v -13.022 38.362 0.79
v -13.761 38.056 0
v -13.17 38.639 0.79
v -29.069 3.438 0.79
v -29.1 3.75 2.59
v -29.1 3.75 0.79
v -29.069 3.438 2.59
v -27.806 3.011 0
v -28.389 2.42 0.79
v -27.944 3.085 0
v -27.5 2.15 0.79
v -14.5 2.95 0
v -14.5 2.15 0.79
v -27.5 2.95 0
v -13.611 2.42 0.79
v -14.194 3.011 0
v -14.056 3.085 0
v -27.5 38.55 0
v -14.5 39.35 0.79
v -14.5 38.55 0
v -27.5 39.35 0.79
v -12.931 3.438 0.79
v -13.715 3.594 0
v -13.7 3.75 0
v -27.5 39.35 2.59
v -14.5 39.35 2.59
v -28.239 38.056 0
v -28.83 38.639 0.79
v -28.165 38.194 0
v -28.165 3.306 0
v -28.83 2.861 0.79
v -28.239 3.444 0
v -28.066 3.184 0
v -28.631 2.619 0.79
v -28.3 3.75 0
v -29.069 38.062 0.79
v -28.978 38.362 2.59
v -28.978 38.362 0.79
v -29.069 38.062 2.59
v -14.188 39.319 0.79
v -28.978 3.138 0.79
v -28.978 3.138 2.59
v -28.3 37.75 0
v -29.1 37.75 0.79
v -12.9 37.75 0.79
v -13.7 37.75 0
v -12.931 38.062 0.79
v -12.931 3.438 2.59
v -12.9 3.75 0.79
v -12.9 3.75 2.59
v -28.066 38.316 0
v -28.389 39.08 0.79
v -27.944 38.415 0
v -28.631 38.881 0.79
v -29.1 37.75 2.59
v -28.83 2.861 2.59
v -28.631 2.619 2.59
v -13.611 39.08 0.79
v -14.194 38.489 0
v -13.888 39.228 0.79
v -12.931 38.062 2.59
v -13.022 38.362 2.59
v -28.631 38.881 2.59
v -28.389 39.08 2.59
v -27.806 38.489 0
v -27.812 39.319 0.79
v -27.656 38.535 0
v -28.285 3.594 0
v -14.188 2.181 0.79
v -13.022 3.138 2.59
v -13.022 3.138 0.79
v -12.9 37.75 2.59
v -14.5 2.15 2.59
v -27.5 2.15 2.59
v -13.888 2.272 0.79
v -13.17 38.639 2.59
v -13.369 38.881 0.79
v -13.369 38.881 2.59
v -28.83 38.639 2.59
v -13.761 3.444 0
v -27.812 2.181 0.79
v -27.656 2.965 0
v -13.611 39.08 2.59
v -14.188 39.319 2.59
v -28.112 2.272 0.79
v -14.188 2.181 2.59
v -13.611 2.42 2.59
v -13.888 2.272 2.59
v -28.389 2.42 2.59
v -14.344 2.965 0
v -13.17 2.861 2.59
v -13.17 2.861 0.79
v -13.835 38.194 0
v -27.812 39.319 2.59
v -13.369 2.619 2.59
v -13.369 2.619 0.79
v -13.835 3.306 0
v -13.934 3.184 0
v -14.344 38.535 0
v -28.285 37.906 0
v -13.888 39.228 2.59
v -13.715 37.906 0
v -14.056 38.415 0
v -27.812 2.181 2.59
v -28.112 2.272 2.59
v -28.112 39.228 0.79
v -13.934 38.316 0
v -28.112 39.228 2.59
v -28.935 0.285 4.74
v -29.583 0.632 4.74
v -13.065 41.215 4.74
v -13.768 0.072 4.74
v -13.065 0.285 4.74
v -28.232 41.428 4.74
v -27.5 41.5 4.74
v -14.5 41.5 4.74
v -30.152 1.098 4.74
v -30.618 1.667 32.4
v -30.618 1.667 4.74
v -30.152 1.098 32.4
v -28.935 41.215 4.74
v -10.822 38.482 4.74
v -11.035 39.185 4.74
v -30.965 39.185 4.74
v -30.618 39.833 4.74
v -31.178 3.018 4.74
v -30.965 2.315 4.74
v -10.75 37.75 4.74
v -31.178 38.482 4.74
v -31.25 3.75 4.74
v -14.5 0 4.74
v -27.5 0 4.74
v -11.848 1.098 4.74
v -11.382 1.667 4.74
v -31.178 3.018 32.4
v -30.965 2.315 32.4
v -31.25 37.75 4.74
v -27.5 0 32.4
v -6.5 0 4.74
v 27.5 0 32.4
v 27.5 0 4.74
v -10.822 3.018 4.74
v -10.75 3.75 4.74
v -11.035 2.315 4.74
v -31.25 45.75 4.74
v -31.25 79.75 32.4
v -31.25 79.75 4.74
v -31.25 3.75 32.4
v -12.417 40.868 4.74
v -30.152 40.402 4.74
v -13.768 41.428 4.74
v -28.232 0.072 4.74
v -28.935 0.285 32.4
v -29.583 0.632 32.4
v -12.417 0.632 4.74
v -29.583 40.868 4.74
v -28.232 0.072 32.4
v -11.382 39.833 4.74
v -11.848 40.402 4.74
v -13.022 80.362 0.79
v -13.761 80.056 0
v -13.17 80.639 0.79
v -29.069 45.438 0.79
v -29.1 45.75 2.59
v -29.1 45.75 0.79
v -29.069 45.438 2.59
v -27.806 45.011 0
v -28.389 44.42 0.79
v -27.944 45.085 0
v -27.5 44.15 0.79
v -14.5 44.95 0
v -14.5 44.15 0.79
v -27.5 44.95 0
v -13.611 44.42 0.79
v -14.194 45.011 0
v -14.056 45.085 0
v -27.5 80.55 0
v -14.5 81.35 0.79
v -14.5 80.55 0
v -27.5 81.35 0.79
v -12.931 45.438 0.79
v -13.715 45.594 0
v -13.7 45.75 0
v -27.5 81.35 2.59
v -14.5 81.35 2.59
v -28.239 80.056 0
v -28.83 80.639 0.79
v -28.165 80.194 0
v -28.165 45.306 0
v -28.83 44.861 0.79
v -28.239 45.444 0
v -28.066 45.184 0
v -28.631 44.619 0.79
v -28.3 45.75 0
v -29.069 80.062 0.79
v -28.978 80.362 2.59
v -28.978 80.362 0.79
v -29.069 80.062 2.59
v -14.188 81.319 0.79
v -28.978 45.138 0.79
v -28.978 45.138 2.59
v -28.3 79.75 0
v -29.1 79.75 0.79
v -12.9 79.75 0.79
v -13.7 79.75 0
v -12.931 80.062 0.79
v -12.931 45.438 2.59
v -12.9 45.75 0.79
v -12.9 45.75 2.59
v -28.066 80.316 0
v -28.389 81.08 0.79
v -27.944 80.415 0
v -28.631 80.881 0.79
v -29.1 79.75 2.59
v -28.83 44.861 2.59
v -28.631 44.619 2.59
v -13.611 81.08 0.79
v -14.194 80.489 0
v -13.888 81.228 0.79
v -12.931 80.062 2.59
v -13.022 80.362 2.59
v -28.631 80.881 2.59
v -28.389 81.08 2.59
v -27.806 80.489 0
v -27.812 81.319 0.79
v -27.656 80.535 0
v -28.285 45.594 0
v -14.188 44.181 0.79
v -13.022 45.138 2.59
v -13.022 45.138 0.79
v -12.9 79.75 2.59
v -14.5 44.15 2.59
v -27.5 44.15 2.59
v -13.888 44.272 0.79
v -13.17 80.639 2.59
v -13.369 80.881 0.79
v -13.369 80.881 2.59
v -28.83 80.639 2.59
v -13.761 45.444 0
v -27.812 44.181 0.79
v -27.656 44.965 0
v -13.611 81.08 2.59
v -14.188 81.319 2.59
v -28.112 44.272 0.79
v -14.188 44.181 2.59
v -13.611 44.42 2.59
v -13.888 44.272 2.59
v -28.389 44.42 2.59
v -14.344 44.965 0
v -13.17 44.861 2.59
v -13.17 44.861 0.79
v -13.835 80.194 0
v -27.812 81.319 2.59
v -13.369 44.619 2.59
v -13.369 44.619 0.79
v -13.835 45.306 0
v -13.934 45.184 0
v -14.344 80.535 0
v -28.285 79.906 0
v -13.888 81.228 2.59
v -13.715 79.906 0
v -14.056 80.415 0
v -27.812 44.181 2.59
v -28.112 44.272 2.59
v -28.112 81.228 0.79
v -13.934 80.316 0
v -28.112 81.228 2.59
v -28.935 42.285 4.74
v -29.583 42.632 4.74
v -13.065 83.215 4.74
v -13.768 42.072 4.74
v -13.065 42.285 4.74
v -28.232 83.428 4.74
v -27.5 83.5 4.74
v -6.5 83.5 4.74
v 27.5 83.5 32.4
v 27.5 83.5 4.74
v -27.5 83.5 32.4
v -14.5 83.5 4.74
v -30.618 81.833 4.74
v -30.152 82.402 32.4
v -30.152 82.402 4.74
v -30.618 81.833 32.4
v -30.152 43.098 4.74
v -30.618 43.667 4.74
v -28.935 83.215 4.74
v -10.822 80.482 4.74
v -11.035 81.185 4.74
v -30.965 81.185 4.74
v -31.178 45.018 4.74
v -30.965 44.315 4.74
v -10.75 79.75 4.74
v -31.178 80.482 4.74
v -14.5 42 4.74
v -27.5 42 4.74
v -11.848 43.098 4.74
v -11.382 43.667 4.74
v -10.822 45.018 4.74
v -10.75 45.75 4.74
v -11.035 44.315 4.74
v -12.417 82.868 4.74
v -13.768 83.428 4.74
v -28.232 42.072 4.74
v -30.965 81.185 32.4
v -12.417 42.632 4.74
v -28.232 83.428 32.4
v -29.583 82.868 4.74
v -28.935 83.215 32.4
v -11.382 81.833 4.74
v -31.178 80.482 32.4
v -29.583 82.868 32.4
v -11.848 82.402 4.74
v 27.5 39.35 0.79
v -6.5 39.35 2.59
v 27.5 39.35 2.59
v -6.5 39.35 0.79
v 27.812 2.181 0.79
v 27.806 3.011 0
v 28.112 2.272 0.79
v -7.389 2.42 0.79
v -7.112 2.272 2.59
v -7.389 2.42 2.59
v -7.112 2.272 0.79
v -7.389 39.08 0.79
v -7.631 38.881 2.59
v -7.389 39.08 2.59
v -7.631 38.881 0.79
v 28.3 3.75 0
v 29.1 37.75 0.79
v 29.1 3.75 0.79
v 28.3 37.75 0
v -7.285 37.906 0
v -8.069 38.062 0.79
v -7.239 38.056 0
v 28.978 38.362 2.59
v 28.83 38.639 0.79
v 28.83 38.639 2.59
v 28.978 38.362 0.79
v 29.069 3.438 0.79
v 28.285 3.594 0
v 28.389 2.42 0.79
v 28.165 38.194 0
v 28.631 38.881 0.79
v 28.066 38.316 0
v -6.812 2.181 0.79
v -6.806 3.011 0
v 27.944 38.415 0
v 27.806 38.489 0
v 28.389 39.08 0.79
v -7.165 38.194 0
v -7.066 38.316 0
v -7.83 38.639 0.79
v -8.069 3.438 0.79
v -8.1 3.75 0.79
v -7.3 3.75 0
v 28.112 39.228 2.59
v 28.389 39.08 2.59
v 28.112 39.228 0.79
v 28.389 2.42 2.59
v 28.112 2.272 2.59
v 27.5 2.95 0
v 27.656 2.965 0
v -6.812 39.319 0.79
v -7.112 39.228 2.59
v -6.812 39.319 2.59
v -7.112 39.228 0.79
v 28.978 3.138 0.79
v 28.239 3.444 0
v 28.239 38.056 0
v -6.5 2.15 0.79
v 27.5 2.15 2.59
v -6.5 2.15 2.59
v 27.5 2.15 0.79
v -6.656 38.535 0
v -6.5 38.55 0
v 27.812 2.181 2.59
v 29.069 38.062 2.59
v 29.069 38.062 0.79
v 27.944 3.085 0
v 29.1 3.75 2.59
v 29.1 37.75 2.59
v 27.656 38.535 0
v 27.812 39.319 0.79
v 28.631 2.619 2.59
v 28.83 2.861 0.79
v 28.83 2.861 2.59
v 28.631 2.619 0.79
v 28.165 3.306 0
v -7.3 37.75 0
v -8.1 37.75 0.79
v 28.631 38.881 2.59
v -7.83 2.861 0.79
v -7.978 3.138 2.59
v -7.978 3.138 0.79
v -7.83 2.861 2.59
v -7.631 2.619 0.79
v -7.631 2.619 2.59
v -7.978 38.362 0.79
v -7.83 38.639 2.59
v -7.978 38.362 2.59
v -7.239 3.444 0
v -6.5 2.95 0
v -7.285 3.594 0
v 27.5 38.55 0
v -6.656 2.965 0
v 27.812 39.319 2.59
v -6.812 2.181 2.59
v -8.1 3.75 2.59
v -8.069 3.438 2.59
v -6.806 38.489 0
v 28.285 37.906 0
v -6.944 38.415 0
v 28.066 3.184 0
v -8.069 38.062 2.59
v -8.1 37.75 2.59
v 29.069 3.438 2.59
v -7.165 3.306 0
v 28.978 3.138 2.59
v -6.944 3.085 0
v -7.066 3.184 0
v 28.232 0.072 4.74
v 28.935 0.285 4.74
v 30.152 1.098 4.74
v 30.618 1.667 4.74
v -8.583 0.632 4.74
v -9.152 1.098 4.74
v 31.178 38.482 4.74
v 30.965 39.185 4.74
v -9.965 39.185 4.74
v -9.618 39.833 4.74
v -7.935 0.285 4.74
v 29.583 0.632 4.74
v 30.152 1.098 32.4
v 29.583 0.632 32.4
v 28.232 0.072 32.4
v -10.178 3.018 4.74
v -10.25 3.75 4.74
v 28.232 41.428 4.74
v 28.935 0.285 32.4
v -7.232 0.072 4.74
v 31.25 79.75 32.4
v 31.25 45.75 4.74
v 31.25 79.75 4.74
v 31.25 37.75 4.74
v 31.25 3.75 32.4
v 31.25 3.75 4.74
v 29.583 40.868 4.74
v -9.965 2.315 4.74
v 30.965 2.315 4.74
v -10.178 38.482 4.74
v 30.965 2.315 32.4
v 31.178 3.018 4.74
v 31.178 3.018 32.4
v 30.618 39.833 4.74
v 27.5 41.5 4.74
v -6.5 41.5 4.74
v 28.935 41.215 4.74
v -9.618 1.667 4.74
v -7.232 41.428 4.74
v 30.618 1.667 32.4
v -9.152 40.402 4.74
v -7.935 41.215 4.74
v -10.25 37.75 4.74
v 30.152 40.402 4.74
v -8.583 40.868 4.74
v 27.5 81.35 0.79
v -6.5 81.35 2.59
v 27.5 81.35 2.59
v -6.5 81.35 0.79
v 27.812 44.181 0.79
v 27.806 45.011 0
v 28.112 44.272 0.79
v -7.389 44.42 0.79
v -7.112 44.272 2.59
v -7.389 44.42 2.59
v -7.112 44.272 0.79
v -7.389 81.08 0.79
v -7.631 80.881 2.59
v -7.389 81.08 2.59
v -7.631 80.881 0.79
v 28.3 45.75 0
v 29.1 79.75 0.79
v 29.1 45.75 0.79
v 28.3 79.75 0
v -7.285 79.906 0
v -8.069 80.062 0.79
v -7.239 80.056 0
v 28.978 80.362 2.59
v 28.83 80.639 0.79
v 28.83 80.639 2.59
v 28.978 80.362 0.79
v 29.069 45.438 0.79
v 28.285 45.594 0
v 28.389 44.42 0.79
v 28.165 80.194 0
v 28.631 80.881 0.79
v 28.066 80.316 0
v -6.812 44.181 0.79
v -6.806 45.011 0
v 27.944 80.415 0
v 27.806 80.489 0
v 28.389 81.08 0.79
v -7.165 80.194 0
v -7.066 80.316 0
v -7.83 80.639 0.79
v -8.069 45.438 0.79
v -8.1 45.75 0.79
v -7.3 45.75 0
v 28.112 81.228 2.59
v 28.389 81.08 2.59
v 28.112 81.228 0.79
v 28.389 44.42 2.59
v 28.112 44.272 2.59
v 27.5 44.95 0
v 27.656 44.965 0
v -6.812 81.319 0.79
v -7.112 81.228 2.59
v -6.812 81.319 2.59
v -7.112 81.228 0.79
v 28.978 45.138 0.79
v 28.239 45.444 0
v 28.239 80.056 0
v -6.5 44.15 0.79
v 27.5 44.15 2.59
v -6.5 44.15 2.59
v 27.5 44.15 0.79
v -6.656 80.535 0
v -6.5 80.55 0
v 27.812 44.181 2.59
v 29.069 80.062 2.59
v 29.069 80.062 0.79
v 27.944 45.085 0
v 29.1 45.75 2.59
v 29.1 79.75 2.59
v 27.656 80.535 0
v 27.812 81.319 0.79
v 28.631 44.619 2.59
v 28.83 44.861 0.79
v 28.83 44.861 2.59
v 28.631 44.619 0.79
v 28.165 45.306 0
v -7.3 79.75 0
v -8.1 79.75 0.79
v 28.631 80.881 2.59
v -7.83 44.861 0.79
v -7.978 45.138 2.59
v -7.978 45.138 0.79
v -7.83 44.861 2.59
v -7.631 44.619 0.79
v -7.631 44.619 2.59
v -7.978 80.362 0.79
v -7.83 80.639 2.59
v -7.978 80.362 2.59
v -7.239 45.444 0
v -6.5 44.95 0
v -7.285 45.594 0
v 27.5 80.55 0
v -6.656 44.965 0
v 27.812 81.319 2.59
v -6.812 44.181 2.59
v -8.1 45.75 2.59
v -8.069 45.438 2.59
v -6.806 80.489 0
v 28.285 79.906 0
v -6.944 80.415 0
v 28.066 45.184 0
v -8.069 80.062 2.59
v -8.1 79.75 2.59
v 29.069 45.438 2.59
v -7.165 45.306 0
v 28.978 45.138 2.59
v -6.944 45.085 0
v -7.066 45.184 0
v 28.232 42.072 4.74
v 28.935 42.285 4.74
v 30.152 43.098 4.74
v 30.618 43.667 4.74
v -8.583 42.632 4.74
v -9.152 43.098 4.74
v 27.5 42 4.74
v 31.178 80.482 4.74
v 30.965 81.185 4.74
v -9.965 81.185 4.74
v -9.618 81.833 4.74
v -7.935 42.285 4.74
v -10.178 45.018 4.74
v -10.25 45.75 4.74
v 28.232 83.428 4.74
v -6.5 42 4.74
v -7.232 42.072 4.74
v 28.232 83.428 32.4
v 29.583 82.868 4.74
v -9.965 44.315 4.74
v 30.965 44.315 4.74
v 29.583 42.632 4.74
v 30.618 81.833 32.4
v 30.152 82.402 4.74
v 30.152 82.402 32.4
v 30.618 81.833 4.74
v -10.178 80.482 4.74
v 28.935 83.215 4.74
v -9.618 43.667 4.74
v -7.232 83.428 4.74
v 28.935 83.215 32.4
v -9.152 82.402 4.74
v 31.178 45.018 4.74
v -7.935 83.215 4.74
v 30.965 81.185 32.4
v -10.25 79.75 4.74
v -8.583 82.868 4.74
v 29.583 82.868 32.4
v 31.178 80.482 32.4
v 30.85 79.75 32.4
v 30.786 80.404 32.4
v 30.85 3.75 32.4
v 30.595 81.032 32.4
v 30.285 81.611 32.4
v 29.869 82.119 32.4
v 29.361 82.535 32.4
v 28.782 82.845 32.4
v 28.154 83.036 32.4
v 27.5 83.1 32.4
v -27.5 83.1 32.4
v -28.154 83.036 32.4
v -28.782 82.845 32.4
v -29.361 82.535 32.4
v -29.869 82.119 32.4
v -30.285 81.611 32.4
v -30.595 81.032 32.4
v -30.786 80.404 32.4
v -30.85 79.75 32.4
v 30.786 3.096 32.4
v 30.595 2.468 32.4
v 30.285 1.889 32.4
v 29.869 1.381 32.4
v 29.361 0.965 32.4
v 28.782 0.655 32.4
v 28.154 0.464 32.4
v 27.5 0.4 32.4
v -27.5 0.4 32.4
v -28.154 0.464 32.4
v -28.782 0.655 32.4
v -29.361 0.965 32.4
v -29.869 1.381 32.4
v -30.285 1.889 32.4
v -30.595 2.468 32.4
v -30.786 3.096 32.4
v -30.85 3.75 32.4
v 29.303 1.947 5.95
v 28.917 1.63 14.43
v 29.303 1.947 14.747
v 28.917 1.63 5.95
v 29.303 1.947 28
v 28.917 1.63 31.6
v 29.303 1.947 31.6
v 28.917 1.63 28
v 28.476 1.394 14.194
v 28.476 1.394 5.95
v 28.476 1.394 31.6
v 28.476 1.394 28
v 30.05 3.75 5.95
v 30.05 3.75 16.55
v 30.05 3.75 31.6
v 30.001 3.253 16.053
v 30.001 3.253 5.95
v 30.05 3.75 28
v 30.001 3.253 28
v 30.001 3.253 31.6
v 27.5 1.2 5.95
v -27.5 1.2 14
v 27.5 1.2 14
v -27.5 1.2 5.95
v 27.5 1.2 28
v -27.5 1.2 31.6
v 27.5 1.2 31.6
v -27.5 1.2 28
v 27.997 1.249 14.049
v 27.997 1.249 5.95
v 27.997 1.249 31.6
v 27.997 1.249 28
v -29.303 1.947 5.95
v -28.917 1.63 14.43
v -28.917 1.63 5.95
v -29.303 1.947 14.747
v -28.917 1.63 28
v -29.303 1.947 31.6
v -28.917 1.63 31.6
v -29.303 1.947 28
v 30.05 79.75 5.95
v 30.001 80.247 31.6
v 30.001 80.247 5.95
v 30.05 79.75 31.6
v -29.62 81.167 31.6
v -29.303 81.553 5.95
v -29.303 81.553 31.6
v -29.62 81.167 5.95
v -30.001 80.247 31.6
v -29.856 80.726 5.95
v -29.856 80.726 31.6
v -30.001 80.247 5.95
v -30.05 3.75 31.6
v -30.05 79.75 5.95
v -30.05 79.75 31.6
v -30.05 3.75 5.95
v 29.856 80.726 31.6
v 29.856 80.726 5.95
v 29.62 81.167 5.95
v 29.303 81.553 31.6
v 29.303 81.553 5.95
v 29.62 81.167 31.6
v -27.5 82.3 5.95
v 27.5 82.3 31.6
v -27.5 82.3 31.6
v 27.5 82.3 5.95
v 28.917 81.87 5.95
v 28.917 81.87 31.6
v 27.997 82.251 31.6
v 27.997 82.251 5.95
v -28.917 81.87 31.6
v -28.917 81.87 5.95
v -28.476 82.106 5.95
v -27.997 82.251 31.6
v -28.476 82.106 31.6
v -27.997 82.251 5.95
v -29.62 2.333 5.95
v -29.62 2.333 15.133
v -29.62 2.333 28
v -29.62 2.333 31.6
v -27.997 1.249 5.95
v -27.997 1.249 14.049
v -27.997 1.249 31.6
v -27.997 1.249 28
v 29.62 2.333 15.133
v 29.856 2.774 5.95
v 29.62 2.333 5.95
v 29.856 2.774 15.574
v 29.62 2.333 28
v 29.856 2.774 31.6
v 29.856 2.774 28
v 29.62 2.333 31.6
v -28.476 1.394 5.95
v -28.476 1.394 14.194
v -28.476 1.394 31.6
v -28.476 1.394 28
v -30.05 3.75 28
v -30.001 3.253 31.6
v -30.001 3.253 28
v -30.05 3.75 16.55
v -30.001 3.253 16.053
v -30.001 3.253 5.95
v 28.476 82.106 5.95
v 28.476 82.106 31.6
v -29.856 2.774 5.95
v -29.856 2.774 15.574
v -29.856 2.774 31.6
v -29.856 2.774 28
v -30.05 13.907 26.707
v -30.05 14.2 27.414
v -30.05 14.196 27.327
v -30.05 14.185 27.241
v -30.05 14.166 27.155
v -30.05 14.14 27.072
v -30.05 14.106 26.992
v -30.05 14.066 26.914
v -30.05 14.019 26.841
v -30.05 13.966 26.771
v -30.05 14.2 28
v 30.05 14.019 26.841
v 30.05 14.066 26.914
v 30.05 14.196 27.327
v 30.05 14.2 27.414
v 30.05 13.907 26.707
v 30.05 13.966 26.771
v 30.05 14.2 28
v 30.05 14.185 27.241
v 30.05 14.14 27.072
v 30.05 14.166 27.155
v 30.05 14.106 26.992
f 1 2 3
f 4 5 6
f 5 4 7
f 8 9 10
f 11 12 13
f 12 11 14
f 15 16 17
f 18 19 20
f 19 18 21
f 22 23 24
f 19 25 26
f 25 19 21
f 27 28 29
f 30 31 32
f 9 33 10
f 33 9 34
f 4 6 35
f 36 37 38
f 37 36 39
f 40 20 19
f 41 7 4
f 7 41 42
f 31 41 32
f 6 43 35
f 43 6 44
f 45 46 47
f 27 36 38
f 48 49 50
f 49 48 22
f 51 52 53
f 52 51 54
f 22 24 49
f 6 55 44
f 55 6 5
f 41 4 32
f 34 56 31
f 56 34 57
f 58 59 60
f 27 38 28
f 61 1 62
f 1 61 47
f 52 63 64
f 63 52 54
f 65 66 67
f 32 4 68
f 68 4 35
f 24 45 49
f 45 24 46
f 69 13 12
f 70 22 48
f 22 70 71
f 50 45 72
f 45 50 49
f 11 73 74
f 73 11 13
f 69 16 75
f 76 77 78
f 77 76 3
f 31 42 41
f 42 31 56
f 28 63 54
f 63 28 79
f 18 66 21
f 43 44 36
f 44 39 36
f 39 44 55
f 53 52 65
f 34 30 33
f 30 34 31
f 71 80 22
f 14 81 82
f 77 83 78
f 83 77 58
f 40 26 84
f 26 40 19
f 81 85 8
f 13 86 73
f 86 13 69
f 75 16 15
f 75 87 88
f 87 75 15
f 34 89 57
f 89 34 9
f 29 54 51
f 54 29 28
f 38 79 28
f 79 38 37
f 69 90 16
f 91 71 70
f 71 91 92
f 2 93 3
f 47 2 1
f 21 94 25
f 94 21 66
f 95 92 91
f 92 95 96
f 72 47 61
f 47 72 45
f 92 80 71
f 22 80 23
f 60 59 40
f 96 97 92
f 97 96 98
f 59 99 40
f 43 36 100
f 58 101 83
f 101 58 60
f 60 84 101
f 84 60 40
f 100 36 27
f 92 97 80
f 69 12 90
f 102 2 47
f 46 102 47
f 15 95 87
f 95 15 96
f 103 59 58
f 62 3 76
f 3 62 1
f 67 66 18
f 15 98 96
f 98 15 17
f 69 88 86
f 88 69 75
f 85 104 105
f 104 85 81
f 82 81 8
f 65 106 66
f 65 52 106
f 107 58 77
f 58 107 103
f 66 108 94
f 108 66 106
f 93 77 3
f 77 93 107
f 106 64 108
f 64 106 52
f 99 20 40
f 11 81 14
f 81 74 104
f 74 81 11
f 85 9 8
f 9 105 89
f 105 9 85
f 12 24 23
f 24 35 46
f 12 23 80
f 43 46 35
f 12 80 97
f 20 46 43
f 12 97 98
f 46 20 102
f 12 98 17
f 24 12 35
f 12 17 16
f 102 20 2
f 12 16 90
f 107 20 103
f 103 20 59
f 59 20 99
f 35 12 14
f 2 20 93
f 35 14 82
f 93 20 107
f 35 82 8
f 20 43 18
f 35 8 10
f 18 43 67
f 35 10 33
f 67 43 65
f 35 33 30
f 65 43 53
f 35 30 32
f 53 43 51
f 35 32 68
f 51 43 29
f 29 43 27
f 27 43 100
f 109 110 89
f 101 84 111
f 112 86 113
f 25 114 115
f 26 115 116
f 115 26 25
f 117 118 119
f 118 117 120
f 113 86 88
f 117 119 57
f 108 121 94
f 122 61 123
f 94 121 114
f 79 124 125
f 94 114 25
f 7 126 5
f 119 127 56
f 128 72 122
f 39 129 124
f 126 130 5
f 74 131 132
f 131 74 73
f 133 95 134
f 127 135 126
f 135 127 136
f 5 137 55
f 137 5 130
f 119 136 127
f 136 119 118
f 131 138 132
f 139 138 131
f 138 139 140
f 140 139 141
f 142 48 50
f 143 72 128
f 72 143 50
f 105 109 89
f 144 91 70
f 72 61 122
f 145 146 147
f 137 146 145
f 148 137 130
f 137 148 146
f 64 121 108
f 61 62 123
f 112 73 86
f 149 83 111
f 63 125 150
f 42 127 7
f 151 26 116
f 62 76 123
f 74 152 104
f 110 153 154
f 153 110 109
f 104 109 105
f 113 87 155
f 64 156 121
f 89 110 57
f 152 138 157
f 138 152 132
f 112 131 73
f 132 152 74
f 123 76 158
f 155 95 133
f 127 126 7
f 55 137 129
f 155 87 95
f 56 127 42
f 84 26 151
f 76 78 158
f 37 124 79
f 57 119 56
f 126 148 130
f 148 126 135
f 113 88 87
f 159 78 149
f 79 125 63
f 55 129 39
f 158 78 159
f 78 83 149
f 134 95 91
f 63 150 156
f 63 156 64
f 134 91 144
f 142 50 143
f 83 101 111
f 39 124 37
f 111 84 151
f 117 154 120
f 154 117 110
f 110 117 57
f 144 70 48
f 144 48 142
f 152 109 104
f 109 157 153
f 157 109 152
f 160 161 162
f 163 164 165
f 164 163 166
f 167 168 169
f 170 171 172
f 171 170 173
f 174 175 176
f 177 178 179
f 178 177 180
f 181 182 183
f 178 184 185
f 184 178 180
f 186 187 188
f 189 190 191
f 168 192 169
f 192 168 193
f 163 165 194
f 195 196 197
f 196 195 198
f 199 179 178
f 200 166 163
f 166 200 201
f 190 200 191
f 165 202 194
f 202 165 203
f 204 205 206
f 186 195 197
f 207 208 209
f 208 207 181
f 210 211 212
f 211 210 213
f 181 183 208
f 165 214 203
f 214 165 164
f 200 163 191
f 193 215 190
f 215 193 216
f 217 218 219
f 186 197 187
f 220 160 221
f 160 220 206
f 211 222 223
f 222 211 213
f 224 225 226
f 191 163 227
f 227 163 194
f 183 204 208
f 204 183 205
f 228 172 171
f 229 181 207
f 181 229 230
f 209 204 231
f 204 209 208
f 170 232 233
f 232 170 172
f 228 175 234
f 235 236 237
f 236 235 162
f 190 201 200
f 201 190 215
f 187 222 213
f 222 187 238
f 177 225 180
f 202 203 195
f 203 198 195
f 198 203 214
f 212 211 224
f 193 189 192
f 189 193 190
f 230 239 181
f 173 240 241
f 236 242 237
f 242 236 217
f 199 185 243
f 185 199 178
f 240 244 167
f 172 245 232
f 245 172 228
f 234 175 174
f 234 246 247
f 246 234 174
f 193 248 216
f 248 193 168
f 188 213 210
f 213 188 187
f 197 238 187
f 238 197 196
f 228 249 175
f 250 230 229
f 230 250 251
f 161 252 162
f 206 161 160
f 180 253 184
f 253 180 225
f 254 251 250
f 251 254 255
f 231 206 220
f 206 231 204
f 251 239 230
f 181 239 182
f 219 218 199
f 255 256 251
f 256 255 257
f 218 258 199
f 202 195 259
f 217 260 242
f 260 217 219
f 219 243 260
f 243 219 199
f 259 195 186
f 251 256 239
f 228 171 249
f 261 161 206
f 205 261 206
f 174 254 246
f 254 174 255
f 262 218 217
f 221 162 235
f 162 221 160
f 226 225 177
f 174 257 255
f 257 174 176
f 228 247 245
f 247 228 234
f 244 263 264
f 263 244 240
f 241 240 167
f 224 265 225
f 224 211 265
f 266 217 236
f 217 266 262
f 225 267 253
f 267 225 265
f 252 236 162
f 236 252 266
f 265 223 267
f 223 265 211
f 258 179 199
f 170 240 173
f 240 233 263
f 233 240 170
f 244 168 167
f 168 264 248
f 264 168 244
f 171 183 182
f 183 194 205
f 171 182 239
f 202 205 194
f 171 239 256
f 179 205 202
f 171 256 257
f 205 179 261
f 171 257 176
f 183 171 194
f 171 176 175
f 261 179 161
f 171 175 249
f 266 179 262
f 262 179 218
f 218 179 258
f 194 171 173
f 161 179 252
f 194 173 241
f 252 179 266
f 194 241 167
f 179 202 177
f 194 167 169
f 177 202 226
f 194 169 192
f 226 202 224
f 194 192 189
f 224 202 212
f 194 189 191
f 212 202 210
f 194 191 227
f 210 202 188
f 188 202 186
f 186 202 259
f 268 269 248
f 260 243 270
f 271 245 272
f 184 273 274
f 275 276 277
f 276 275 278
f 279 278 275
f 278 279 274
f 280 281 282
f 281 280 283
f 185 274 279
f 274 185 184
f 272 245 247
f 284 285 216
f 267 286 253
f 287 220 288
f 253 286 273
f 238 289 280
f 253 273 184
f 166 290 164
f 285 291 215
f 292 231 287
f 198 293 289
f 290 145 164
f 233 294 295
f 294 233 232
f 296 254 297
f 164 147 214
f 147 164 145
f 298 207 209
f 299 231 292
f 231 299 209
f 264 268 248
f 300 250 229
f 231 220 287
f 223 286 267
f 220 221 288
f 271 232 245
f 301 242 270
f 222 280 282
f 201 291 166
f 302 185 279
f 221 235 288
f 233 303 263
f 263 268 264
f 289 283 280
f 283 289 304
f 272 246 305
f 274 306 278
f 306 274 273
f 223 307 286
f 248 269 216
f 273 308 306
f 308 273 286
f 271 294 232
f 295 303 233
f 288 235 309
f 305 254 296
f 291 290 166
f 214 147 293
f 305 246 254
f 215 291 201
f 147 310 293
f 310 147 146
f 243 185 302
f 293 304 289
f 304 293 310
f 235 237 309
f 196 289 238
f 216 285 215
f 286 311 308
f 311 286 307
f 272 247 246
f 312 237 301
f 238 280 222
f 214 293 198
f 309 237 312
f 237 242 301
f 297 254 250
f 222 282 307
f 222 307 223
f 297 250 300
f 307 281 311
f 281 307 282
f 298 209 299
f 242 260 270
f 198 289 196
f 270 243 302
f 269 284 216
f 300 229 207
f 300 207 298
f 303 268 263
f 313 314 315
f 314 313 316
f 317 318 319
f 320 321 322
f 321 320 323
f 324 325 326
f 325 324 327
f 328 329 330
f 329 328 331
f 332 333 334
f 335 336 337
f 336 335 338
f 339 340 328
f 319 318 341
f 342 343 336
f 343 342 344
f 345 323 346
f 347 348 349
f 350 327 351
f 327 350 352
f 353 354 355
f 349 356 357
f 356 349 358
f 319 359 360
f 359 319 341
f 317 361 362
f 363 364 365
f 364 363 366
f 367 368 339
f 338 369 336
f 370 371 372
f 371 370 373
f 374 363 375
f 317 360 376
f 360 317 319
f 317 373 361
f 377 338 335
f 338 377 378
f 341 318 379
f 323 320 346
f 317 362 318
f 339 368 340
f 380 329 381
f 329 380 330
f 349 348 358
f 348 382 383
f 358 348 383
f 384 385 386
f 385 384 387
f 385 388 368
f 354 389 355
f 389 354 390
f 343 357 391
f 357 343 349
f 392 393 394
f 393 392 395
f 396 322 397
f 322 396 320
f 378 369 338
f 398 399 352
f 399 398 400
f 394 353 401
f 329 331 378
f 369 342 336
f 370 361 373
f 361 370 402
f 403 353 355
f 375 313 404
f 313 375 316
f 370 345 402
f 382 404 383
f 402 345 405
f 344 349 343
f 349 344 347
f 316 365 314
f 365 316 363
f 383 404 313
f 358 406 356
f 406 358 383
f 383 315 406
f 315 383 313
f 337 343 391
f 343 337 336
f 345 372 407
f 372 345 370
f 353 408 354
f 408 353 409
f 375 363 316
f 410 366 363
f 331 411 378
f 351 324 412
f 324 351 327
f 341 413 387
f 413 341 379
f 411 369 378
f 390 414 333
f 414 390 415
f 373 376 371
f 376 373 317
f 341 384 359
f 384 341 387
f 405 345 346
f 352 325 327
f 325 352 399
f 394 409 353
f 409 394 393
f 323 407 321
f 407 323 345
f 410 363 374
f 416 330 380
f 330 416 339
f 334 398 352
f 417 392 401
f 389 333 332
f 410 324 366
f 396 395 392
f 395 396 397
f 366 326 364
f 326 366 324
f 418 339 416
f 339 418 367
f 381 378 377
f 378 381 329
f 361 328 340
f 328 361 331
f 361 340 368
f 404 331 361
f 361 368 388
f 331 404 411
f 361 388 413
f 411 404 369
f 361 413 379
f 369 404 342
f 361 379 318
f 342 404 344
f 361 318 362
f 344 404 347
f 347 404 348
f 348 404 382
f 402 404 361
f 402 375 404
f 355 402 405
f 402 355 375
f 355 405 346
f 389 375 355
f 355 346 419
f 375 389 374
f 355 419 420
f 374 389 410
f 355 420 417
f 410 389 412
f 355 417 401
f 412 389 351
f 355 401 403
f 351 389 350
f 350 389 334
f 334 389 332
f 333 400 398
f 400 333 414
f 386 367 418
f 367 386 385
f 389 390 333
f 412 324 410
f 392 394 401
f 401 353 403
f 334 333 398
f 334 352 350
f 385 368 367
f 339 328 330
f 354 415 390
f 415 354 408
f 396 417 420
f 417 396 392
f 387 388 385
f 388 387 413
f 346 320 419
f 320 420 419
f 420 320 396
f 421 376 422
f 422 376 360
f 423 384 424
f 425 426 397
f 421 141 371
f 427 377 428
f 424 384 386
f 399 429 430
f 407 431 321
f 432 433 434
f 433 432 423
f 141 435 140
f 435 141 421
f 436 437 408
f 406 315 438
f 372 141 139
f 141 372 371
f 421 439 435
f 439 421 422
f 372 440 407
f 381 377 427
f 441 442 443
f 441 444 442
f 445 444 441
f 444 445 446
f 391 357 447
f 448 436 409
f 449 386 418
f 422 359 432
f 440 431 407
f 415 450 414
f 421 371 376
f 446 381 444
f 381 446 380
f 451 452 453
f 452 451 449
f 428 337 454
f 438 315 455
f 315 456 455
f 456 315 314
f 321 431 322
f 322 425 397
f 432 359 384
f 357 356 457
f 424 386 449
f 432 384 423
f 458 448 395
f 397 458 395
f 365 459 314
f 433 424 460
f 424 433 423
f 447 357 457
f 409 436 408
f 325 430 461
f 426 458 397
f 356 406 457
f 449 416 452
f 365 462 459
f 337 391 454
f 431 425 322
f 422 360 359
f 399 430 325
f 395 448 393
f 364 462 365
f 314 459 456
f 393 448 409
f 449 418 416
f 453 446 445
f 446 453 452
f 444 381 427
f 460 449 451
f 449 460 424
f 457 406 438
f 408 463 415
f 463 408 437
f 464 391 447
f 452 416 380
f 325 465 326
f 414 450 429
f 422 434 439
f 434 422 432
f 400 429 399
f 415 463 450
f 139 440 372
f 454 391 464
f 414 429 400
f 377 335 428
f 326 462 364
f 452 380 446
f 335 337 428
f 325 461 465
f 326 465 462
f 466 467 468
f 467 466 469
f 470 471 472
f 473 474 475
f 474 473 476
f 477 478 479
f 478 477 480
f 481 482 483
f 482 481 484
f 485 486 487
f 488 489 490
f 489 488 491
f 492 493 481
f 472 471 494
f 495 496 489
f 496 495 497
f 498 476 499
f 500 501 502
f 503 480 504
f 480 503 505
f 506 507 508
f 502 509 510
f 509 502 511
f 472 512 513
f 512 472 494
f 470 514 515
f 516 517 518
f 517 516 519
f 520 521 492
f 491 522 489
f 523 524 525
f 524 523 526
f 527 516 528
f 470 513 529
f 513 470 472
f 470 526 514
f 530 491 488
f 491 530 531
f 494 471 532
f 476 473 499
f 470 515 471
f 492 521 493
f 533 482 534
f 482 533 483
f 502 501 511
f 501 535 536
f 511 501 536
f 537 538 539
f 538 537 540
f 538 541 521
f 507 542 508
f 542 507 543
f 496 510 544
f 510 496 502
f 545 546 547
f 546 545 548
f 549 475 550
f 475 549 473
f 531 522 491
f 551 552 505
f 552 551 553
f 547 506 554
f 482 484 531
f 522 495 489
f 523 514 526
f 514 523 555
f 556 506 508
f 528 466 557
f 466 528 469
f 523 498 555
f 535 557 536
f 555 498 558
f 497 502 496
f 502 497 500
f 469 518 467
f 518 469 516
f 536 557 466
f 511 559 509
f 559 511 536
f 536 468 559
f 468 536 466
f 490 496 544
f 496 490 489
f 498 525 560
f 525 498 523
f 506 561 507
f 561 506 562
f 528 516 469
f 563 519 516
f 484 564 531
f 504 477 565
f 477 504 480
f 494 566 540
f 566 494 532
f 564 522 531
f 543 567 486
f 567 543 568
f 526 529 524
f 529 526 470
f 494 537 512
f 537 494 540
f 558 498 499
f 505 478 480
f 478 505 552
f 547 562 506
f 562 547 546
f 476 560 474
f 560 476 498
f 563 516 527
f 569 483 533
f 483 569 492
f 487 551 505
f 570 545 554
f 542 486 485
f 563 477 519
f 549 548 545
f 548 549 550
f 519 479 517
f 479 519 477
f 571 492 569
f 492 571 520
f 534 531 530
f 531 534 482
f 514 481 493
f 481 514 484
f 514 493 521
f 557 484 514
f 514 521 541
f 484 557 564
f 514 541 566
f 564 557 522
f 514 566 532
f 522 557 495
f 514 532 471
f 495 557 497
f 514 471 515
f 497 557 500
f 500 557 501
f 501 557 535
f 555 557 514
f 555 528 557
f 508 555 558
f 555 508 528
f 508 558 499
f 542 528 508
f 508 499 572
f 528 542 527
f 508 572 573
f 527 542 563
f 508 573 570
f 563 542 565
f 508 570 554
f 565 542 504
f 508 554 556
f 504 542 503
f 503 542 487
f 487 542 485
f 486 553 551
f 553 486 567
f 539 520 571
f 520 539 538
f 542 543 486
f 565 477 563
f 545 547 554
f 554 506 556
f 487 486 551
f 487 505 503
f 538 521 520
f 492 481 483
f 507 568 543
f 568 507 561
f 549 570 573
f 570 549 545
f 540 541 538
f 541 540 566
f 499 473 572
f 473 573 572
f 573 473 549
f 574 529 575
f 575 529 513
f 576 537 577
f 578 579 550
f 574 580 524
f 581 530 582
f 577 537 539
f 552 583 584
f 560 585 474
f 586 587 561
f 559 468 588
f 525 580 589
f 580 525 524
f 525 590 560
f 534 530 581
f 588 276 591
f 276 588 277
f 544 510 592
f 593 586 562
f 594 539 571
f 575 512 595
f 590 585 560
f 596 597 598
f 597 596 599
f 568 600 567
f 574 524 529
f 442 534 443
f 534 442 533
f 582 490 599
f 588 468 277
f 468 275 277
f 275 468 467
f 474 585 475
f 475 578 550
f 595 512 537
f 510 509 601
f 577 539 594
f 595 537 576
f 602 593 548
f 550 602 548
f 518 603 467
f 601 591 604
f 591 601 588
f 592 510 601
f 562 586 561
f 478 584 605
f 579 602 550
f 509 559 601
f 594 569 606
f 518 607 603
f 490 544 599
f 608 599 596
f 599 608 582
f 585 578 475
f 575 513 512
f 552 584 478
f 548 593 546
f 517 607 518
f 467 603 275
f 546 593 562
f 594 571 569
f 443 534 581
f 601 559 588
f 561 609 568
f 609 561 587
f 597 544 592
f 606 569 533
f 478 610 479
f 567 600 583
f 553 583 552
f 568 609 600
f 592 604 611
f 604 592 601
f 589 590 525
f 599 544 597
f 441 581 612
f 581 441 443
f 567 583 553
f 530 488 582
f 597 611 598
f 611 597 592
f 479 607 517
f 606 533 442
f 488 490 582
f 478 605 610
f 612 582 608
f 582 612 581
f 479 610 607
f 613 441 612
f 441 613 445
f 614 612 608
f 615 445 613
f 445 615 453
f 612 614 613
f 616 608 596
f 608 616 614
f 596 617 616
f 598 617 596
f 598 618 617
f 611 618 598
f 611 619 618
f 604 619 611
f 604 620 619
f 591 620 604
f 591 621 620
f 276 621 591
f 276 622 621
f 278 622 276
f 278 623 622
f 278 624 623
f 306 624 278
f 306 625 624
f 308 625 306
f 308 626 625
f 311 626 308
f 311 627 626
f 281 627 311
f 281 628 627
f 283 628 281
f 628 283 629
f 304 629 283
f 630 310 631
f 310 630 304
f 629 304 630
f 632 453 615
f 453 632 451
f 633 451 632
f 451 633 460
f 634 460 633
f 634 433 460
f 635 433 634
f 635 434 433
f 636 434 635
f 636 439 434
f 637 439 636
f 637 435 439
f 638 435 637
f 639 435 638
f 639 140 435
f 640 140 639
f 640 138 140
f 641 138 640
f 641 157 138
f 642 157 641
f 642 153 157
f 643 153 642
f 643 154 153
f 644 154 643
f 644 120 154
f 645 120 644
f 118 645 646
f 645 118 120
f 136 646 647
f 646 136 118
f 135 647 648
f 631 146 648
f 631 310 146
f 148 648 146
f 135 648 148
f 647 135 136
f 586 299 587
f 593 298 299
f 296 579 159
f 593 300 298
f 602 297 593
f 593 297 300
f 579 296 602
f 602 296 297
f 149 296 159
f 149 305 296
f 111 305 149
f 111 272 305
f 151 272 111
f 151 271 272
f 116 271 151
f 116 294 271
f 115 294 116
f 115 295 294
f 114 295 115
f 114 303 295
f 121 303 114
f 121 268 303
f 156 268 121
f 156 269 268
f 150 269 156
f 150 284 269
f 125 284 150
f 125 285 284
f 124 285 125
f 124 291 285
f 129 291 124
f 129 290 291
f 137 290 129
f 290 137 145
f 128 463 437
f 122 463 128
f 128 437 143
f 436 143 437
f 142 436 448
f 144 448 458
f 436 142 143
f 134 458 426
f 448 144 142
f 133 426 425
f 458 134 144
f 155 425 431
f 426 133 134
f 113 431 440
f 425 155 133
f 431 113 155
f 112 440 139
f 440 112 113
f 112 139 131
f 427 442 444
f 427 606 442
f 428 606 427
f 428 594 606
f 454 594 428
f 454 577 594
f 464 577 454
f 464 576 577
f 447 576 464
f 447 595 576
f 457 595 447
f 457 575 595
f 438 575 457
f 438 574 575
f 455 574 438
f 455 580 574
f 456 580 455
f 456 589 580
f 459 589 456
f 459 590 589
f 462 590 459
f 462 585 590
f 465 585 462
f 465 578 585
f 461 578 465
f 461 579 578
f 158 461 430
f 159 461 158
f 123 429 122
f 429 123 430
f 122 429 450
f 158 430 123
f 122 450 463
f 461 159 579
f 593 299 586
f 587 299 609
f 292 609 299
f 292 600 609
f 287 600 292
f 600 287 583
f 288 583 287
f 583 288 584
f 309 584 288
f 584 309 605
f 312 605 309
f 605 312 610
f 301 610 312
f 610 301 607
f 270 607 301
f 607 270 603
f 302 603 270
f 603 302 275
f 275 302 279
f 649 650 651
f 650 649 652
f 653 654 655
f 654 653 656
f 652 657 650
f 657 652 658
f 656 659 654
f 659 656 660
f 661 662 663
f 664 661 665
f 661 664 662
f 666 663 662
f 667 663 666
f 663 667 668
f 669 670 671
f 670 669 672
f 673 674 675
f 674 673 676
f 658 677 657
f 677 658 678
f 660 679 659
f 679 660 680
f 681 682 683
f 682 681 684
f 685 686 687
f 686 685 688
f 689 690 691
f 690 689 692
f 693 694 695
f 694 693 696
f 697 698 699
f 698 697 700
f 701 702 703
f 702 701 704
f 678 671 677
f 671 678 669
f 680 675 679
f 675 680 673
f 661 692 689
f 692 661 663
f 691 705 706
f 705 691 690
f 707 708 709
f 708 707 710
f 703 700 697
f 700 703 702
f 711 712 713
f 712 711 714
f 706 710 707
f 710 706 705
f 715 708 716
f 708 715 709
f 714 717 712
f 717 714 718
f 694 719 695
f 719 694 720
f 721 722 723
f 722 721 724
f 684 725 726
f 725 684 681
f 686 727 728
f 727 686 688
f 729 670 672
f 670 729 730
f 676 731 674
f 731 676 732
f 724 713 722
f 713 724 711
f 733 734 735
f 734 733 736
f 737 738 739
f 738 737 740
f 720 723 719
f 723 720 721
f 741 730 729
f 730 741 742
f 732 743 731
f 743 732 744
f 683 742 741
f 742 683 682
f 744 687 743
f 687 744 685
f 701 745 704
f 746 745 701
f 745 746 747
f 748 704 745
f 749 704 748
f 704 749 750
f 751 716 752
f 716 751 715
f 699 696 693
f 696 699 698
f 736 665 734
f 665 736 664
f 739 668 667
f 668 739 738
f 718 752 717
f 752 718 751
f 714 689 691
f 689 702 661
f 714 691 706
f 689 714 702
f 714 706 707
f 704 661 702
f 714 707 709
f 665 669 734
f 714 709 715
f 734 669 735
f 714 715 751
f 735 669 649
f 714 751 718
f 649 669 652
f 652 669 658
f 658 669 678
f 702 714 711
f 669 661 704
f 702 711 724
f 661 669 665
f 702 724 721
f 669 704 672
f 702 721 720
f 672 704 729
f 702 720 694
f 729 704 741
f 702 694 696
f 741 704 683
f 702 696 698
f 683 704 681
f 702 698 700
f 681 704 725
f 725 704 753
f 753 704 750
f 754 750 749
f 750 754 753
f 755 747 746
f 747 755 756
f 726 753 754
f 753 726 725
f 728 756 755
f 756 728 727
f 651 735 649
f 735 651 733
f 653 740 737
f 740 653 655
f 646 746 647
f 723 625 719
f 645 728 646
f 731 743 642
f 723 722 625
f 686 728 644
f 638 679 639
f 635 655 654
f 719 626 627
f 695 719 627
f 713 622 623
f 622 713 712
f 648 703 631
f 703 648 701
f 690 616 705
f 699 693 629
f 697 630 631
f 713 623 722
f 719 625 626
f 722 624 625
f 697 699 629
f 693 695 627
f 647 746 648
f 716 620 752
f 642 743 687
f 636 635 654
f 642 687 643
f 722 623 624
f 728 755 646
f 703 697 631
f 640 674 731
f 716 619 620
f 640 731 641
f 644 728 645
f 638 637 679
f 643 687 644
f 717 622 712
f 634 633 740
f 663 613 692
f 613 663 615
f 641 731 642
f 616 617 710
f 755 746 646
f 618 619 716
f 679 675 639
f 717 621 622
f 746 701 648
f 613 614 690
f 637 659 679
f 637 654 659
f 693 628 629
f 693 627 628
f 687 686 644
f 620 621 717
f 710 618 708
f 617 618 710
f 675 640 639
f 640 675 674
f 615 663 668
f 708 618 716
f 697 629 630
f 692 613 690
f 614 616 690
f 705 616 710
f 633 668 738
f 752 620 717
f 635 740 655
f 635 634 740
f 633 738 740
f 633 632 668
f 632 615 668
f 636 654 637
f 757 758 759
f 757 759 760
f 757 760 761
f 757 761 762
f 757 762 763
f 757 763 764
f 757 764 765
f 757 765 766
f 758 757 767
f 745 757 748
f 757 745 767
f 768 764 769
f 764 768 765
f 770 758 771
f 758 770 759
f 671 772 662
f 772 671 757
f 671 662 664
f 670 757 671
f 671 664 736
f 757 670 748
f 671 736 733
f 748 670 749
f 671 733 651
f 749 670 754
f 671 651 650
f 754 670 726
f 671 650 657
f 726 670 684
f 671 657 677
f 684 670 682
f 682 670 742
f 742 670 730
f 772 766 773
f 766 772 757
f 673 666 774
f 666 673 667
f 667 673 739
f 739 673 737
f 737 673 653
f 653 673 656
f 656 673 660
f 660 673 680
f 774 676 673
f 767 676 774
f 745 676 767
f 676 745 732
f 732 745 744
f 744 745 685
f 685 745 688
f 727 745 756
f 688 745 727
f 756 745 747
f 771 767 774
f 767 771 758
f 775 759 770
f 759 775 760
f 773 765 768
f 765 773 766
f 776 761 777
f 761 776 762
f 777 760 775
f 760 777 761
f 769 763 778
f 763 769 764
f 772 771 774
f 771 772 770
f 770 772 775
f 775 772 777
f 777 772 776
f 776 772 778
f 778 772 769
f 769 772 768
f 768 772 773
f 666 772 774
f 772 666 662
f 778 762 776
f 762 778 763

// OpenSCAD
// file: ../../../modules/gridfinity.scad
// Gridfinity ベースプレートの共有 module。
// 寸法は Gridfinity 仕様 (Zack Freedman) の baseplate 輪郭に従う:
//   ピッチ 42、ソケット上端開口 41.5 (角 R4)、上から 45° 面取り 2.15 →
//   垂直 1.8 (37.2 角・R1.85) → 45° 面取り 0.7 → 底 35.8 角 (R1.15)。
//   ソケット深さ = 2.15 + 1.8 + 0.7 = 4.65。
//
// 座標系: X が列方向 (中央が 0)、Y が行方向 (板の前端が 0)、Z=0 が板の底面。
// 板の外形は grid とは独立に rim で与えるので、grid より大きい板 (縁付き) を
// 作れる。ソケットは rim=[left, right, front, back] の内側へ 42 ピッチで並ぶ。

gf_pitch = 42;
gf_socket_top = 41.5; // 上端開口
gf_socket_mid = 37.2; // 垂直部
gf_socket_bot = 35.8; // 底
gf_socket_r_top = 4;
gf_socket_r_mid = 1.85;
gf_socket_r_bot = 1.15;
gf_chamfer_top = 2.15;
gf_wall_h = 1.8;
gf_chamfer_bot = 0.7;
gf_socket_depth = gf_chamfer_top + gf_wall_h + gf_chamfer_bot; // 4.65
gf_fn = 32;
gf_eps = 0.01; // hull 用の薄板の厚さ
gf_over = 0.5; // 切削の抜き代

// 角丸正方形または矩形 (w は一辺、または [幅, 奥行き]、角 R)
module
gf_rounded_square(w, r)
{
    offset(r = r, $fn = gf_fn)
        square(is_list(w) ? w - [ 2 * r, 2 * r ] : w - 2 * r, center = true);
}

// 厚さ gf_eps の角丸正方形の薄板を z に置く (hull の骨)
module
gf_slab(w, r, z)
{
    translate([ 0, 0, z ]) linear_extrude(gf_eps) gf_rounded_square(w, r);
}

// ソケット1個の切削体。z=0 がソケットの底 (床の天面)、+Z へ 4.65 で天面に出る。
// clearance は嵌合の逃げで、輪郭を全周へ clearance だけ外へ出す (幅 +2c、角 R
// +c)。pitch_x は X 方向のセル幅。端数でも角 R と面取りの寸法を保つ。
module
gf_socket_cut(clearance = 0, pitch_x = gf_pitch)
{
    z1 = gf_chamfer_bot;
    z2 = z1 + gf_wall_h;
    z3 = gf_socket_depth;
    c = clearance;
    assert(pitch_x > gf_pitch - gf_socket_top + 2 * gf_socket_r_top,
           "Cell width is too small for the socket corner radius");
    delta = [ pitch_x - gf_pitch, 0 ];
    bot = [ gf_socket_bot + 2 * c, gf_socket_bot + 2 * c ] + delta;
    mid = [ gf_socket_mid + 2 * c, gf_socket_mid + 2 * c ] + delta;
    top = [ gf_socket_top + 2 * c, gf_socket_top + 2 * c ] + delta;
    hull()
    {
        gf_slab(bot, gf_socket_r_bot + c, 0);
        gf_slab(mid, gf_socket_r_mid + c, z1 - gf_eps);
    }
    hull()
    {
        gf_slab(mid, gf_socket_r_mid + c, z1 - gf_eps);
        gf_slab(mid, gf_socket_r_mid + c, z2 - gf_eps);
    }
    hull()
    {
        gf_slab(mid, gf_socket_r_mid + c, z2 - gf_eps);
        gf_slab(top, gf_socket_r_top + c, z3 - gf_eps);
    }
    // 天面より上へ抜く (天面と同一平面の退化した面を残さない)
    gf_slab(top, gf_socket_r_top + c, z3 - gf_eps);
    translate([ 0, 0, z3 - gf_eps ]) linear_extrude(gf_over + gf_eps)
        gf_rounded_square(top, gf_socket_r_top + c);
}

// ベースプレート。cols x rows のソケットを床 floor_t の上に彫る。
// rim = [left, right, front, back] はソケット列の外側に残す縁の幅。
// 板の幅 = cols*42 + left + right、奥行き = rows*42 + front + back。
// cols の端数は左端の細幅セルになる。rows は正の整数。
// clearance はソケットの嵌合の逃げ (gf_socket_cut を参照)。
module
gf_baseplate(cols, rows, rim = [ 0, 0, 0, 0 ], floor_t = 1, clearance = 0)
{
    grid_w = cols * gf_pitch;
    grid_d = rows * gf_pitch;
    plate_w = grid_w + rim[0] + rim[1];
    plate_d = grid_d + rim[2] + rim[3];
    x0 = -plate_w / 2 + rim[0]; // ソケット列の左端
    first_pitch = grid_w - (ceil(cols) - 1) * gf_pitch;
    difference()
    {
        translate([ -plate_w / 2, 0, 0 ])
            cube([ plate_w, plate_d, floor_t + gf_socket_depth ]);
        for (c = [0:ceil(cols) - 1], r = [0:rows - 1])
            translate([
                x0 + (c == 0 ? first_pitch / 2
                             : first_pitch + (c - 0.5) * gf_pitch),
                rim[2] + (r + 0.5) * gf_pitch,
                floor_t
            ]) gf_socket_cut(clearance, c == 0 ? first_pitch : gf_pitch);
    }
}
// file: ../../../modules/gridfinity_bins.scad
include <gridfinity_bin.scad>

// assets/gridfinity-bin/ の bin 群の共通値と、サイズ 3 引数の払い出し口。
// 単体では何も描かない。設計の経緯と確定値は
// ledger/designs/gridfinity-bin-4u.md が正本。
// 通常binは4U/9U、X={1,1.5,2,2.5,3} × Y={1,2,3,4,5,5.5}。
// 両軸に端数を持つ組み合わせはassetに置かない（各高さ28種）。
// Xが横、Yがラベルの壁から奥、unitsが高さ（7mm単位）。
wall = 1.2;    // 0.4 ノズル 3 本
floor_t = 1.2; // 底 (4.75) の上に載せる床。床の天面 z = 5.95
label_d = 13;  // 12mm 幅のラベルシールを貼る天板の張り出し
label_t = 1; // 天板の厚さ (user 指定)。下は 45° の無垢のくさび
label_r = 1; // 天板の先端と 45° 面の境目の R (user 指定)
// カードケース (goods/card_case_2x3x4u.scad) の値。カードは ISO/IEC 7810 ID-1 (85.6 × 54 ×
// 0.76、隅 R3) で、長辺を Y (rows 方向) に寝かせ、X 中央・手前の壁から 10 奥に置く。ポケットは
// カードより 1 大きい (片側 0.5)。右奥のマスは壁の内面まで抜き、床と底を外形に平行な 45° の窪みにする。
// ポケットの左右の埋めの天面 (幅 13.05) が 12mm のラベルを貼る帯。ポケットと穴の交点の
// 縦エッジは丸める (開口の上縁は丸めない: 壁を上端まで垂直に保ち、収まる枚数を減らさない)
card_w = 54;    // カードの短辺 (X)。user 指定「高さ 54」
card_d = 85.6;  // カードの長辺 (Y)。user 指定「幅 85.6」
card_clear = 1; // ポケットの余裕 (user 指定「+1mm」)
// ポケットの手前の辺の、手前の壁の内面からの距離 (user 指定「10mm」)
card_off = 10;
// ポケットの平面の隅 R (user 指定「角の丸み 3mm」。ID-1 の隅は 2.88..3.48)
card_r = 3;
// ポケットと穴が交わる所の、埋めの凸の縦エッジの R (指の当たる角)
card_edge_r = 2;
recess_skin = floor_t + 1.75; // 窪みの床 z (底の皮)。user 指定「壁厚と同じ 1.2 は過剰、1.75 返す」

function bin_contract(cols, rows, units) = str("CONTRACT units=",
                                               units,
                                               " pitch=",
                                               gf_pitch,
                                               " outer=",
                                               gfb_outer,
                                               " h=",
                                               units* gfb_unit,
                                               " lip=",
                                               gfb_lip_h,
                                               " base=",
                                               gfb_base_bot,
                                               "/",
                                               gfb_base_mid,
                                               "/",
                                               gfb_outer,
                                               " base_h=",
                                               gfb_base_h,
                                               " wall=",
                                               wall,
                                               " floor_top=",
                                               gfb_base_h + floor_t,
                                               " label=",
                                               label_d,
                                               "x",
                                               label_t,
                                               " wedge=45 fillet=",
                                               label_r,
                                               " bin=",
                                               cols,
                                               "x",
                                               rows,
                                               " size=",
                                               cols* gf_pitch - 0.5,
                                               "x",
                                               rows* gf_pitch - 0.5);

// (cols, rows, units) でラベル付き bin を払い出す。例: gridfinity_bin(2, 4, 4)
module
gridfinity_bin(cols, rows, units = 4)
{
    echo(bin_contract(cols, rows, units));
    gfb_bin(cols, rows, units, wall, floor_t, label_d, label_t, label_r);
}

function card_contract(cols, rows, units) = str("CONTRACT card units=",
                                                units,
                                                " bin=",
                                                cols,
                                                "x",
                                                rows,
                                                " size=",
                                                cols* gf_pitch - 0.5,
                                                "x",
                                                rows* gf_pitch - 0.5,
                                                " h=",
                                                units* gfb_unit,
                                                " lip=",
                                                gfb_lip_h,
                                                " floor_top=",
                                                gfb_base_h + floor_t,
                                                " card=",
                                                card_w,
                                                "x",
                                                card_d,
                                                " pocket=",
                                                card_w + card_clear,
                                                "x",
                                                card_d + card_clear,
                                                " at=",
                                                -(card_w + card_clear) / 2,
                                                ",",
                                                wall + card_off,
                                                " hole=",
                                                (cols - 1) / 2 * gf_pitch - gfb_outer / 2,
                                                ",",
                                                (rows - 0.5) * gf_pitch - 0.25 - gfb_outer / 2,
                                                " hole_r=",
                                                gfb_outer_r - wall,
                                                " recess=",
                                                gfb_outer - 2 * wall,
                                                "/",
                                                gfb_base_mid - 2 * wall,
                                                " recess_floor=",
                                                recess_skin,
                                                " r=",
                                                card_r,
                                                " edge_r=",
                                                card_edge_r);

// (cols, rows, units) でカードケースを払い出す。例: gridfinity_card_case(2, 3, 4)
module
gridfinity_card_case(cols, rows, units = 4)
{
    echo(card_contract(cols, rows, units));
    gfb_card_case(cols,
                  rows,
                  units,
                  wall,
                  floor_t,
                  [ card_w, card_d ],
                  card_clear,
                  card_off,
                  card_r,
                  recess_skin,
                  card_edge_r);
}
// main file
include <../../../modules/gridfinity_bins.scad>

gridfinity_bin(1.5, 2, 4);
